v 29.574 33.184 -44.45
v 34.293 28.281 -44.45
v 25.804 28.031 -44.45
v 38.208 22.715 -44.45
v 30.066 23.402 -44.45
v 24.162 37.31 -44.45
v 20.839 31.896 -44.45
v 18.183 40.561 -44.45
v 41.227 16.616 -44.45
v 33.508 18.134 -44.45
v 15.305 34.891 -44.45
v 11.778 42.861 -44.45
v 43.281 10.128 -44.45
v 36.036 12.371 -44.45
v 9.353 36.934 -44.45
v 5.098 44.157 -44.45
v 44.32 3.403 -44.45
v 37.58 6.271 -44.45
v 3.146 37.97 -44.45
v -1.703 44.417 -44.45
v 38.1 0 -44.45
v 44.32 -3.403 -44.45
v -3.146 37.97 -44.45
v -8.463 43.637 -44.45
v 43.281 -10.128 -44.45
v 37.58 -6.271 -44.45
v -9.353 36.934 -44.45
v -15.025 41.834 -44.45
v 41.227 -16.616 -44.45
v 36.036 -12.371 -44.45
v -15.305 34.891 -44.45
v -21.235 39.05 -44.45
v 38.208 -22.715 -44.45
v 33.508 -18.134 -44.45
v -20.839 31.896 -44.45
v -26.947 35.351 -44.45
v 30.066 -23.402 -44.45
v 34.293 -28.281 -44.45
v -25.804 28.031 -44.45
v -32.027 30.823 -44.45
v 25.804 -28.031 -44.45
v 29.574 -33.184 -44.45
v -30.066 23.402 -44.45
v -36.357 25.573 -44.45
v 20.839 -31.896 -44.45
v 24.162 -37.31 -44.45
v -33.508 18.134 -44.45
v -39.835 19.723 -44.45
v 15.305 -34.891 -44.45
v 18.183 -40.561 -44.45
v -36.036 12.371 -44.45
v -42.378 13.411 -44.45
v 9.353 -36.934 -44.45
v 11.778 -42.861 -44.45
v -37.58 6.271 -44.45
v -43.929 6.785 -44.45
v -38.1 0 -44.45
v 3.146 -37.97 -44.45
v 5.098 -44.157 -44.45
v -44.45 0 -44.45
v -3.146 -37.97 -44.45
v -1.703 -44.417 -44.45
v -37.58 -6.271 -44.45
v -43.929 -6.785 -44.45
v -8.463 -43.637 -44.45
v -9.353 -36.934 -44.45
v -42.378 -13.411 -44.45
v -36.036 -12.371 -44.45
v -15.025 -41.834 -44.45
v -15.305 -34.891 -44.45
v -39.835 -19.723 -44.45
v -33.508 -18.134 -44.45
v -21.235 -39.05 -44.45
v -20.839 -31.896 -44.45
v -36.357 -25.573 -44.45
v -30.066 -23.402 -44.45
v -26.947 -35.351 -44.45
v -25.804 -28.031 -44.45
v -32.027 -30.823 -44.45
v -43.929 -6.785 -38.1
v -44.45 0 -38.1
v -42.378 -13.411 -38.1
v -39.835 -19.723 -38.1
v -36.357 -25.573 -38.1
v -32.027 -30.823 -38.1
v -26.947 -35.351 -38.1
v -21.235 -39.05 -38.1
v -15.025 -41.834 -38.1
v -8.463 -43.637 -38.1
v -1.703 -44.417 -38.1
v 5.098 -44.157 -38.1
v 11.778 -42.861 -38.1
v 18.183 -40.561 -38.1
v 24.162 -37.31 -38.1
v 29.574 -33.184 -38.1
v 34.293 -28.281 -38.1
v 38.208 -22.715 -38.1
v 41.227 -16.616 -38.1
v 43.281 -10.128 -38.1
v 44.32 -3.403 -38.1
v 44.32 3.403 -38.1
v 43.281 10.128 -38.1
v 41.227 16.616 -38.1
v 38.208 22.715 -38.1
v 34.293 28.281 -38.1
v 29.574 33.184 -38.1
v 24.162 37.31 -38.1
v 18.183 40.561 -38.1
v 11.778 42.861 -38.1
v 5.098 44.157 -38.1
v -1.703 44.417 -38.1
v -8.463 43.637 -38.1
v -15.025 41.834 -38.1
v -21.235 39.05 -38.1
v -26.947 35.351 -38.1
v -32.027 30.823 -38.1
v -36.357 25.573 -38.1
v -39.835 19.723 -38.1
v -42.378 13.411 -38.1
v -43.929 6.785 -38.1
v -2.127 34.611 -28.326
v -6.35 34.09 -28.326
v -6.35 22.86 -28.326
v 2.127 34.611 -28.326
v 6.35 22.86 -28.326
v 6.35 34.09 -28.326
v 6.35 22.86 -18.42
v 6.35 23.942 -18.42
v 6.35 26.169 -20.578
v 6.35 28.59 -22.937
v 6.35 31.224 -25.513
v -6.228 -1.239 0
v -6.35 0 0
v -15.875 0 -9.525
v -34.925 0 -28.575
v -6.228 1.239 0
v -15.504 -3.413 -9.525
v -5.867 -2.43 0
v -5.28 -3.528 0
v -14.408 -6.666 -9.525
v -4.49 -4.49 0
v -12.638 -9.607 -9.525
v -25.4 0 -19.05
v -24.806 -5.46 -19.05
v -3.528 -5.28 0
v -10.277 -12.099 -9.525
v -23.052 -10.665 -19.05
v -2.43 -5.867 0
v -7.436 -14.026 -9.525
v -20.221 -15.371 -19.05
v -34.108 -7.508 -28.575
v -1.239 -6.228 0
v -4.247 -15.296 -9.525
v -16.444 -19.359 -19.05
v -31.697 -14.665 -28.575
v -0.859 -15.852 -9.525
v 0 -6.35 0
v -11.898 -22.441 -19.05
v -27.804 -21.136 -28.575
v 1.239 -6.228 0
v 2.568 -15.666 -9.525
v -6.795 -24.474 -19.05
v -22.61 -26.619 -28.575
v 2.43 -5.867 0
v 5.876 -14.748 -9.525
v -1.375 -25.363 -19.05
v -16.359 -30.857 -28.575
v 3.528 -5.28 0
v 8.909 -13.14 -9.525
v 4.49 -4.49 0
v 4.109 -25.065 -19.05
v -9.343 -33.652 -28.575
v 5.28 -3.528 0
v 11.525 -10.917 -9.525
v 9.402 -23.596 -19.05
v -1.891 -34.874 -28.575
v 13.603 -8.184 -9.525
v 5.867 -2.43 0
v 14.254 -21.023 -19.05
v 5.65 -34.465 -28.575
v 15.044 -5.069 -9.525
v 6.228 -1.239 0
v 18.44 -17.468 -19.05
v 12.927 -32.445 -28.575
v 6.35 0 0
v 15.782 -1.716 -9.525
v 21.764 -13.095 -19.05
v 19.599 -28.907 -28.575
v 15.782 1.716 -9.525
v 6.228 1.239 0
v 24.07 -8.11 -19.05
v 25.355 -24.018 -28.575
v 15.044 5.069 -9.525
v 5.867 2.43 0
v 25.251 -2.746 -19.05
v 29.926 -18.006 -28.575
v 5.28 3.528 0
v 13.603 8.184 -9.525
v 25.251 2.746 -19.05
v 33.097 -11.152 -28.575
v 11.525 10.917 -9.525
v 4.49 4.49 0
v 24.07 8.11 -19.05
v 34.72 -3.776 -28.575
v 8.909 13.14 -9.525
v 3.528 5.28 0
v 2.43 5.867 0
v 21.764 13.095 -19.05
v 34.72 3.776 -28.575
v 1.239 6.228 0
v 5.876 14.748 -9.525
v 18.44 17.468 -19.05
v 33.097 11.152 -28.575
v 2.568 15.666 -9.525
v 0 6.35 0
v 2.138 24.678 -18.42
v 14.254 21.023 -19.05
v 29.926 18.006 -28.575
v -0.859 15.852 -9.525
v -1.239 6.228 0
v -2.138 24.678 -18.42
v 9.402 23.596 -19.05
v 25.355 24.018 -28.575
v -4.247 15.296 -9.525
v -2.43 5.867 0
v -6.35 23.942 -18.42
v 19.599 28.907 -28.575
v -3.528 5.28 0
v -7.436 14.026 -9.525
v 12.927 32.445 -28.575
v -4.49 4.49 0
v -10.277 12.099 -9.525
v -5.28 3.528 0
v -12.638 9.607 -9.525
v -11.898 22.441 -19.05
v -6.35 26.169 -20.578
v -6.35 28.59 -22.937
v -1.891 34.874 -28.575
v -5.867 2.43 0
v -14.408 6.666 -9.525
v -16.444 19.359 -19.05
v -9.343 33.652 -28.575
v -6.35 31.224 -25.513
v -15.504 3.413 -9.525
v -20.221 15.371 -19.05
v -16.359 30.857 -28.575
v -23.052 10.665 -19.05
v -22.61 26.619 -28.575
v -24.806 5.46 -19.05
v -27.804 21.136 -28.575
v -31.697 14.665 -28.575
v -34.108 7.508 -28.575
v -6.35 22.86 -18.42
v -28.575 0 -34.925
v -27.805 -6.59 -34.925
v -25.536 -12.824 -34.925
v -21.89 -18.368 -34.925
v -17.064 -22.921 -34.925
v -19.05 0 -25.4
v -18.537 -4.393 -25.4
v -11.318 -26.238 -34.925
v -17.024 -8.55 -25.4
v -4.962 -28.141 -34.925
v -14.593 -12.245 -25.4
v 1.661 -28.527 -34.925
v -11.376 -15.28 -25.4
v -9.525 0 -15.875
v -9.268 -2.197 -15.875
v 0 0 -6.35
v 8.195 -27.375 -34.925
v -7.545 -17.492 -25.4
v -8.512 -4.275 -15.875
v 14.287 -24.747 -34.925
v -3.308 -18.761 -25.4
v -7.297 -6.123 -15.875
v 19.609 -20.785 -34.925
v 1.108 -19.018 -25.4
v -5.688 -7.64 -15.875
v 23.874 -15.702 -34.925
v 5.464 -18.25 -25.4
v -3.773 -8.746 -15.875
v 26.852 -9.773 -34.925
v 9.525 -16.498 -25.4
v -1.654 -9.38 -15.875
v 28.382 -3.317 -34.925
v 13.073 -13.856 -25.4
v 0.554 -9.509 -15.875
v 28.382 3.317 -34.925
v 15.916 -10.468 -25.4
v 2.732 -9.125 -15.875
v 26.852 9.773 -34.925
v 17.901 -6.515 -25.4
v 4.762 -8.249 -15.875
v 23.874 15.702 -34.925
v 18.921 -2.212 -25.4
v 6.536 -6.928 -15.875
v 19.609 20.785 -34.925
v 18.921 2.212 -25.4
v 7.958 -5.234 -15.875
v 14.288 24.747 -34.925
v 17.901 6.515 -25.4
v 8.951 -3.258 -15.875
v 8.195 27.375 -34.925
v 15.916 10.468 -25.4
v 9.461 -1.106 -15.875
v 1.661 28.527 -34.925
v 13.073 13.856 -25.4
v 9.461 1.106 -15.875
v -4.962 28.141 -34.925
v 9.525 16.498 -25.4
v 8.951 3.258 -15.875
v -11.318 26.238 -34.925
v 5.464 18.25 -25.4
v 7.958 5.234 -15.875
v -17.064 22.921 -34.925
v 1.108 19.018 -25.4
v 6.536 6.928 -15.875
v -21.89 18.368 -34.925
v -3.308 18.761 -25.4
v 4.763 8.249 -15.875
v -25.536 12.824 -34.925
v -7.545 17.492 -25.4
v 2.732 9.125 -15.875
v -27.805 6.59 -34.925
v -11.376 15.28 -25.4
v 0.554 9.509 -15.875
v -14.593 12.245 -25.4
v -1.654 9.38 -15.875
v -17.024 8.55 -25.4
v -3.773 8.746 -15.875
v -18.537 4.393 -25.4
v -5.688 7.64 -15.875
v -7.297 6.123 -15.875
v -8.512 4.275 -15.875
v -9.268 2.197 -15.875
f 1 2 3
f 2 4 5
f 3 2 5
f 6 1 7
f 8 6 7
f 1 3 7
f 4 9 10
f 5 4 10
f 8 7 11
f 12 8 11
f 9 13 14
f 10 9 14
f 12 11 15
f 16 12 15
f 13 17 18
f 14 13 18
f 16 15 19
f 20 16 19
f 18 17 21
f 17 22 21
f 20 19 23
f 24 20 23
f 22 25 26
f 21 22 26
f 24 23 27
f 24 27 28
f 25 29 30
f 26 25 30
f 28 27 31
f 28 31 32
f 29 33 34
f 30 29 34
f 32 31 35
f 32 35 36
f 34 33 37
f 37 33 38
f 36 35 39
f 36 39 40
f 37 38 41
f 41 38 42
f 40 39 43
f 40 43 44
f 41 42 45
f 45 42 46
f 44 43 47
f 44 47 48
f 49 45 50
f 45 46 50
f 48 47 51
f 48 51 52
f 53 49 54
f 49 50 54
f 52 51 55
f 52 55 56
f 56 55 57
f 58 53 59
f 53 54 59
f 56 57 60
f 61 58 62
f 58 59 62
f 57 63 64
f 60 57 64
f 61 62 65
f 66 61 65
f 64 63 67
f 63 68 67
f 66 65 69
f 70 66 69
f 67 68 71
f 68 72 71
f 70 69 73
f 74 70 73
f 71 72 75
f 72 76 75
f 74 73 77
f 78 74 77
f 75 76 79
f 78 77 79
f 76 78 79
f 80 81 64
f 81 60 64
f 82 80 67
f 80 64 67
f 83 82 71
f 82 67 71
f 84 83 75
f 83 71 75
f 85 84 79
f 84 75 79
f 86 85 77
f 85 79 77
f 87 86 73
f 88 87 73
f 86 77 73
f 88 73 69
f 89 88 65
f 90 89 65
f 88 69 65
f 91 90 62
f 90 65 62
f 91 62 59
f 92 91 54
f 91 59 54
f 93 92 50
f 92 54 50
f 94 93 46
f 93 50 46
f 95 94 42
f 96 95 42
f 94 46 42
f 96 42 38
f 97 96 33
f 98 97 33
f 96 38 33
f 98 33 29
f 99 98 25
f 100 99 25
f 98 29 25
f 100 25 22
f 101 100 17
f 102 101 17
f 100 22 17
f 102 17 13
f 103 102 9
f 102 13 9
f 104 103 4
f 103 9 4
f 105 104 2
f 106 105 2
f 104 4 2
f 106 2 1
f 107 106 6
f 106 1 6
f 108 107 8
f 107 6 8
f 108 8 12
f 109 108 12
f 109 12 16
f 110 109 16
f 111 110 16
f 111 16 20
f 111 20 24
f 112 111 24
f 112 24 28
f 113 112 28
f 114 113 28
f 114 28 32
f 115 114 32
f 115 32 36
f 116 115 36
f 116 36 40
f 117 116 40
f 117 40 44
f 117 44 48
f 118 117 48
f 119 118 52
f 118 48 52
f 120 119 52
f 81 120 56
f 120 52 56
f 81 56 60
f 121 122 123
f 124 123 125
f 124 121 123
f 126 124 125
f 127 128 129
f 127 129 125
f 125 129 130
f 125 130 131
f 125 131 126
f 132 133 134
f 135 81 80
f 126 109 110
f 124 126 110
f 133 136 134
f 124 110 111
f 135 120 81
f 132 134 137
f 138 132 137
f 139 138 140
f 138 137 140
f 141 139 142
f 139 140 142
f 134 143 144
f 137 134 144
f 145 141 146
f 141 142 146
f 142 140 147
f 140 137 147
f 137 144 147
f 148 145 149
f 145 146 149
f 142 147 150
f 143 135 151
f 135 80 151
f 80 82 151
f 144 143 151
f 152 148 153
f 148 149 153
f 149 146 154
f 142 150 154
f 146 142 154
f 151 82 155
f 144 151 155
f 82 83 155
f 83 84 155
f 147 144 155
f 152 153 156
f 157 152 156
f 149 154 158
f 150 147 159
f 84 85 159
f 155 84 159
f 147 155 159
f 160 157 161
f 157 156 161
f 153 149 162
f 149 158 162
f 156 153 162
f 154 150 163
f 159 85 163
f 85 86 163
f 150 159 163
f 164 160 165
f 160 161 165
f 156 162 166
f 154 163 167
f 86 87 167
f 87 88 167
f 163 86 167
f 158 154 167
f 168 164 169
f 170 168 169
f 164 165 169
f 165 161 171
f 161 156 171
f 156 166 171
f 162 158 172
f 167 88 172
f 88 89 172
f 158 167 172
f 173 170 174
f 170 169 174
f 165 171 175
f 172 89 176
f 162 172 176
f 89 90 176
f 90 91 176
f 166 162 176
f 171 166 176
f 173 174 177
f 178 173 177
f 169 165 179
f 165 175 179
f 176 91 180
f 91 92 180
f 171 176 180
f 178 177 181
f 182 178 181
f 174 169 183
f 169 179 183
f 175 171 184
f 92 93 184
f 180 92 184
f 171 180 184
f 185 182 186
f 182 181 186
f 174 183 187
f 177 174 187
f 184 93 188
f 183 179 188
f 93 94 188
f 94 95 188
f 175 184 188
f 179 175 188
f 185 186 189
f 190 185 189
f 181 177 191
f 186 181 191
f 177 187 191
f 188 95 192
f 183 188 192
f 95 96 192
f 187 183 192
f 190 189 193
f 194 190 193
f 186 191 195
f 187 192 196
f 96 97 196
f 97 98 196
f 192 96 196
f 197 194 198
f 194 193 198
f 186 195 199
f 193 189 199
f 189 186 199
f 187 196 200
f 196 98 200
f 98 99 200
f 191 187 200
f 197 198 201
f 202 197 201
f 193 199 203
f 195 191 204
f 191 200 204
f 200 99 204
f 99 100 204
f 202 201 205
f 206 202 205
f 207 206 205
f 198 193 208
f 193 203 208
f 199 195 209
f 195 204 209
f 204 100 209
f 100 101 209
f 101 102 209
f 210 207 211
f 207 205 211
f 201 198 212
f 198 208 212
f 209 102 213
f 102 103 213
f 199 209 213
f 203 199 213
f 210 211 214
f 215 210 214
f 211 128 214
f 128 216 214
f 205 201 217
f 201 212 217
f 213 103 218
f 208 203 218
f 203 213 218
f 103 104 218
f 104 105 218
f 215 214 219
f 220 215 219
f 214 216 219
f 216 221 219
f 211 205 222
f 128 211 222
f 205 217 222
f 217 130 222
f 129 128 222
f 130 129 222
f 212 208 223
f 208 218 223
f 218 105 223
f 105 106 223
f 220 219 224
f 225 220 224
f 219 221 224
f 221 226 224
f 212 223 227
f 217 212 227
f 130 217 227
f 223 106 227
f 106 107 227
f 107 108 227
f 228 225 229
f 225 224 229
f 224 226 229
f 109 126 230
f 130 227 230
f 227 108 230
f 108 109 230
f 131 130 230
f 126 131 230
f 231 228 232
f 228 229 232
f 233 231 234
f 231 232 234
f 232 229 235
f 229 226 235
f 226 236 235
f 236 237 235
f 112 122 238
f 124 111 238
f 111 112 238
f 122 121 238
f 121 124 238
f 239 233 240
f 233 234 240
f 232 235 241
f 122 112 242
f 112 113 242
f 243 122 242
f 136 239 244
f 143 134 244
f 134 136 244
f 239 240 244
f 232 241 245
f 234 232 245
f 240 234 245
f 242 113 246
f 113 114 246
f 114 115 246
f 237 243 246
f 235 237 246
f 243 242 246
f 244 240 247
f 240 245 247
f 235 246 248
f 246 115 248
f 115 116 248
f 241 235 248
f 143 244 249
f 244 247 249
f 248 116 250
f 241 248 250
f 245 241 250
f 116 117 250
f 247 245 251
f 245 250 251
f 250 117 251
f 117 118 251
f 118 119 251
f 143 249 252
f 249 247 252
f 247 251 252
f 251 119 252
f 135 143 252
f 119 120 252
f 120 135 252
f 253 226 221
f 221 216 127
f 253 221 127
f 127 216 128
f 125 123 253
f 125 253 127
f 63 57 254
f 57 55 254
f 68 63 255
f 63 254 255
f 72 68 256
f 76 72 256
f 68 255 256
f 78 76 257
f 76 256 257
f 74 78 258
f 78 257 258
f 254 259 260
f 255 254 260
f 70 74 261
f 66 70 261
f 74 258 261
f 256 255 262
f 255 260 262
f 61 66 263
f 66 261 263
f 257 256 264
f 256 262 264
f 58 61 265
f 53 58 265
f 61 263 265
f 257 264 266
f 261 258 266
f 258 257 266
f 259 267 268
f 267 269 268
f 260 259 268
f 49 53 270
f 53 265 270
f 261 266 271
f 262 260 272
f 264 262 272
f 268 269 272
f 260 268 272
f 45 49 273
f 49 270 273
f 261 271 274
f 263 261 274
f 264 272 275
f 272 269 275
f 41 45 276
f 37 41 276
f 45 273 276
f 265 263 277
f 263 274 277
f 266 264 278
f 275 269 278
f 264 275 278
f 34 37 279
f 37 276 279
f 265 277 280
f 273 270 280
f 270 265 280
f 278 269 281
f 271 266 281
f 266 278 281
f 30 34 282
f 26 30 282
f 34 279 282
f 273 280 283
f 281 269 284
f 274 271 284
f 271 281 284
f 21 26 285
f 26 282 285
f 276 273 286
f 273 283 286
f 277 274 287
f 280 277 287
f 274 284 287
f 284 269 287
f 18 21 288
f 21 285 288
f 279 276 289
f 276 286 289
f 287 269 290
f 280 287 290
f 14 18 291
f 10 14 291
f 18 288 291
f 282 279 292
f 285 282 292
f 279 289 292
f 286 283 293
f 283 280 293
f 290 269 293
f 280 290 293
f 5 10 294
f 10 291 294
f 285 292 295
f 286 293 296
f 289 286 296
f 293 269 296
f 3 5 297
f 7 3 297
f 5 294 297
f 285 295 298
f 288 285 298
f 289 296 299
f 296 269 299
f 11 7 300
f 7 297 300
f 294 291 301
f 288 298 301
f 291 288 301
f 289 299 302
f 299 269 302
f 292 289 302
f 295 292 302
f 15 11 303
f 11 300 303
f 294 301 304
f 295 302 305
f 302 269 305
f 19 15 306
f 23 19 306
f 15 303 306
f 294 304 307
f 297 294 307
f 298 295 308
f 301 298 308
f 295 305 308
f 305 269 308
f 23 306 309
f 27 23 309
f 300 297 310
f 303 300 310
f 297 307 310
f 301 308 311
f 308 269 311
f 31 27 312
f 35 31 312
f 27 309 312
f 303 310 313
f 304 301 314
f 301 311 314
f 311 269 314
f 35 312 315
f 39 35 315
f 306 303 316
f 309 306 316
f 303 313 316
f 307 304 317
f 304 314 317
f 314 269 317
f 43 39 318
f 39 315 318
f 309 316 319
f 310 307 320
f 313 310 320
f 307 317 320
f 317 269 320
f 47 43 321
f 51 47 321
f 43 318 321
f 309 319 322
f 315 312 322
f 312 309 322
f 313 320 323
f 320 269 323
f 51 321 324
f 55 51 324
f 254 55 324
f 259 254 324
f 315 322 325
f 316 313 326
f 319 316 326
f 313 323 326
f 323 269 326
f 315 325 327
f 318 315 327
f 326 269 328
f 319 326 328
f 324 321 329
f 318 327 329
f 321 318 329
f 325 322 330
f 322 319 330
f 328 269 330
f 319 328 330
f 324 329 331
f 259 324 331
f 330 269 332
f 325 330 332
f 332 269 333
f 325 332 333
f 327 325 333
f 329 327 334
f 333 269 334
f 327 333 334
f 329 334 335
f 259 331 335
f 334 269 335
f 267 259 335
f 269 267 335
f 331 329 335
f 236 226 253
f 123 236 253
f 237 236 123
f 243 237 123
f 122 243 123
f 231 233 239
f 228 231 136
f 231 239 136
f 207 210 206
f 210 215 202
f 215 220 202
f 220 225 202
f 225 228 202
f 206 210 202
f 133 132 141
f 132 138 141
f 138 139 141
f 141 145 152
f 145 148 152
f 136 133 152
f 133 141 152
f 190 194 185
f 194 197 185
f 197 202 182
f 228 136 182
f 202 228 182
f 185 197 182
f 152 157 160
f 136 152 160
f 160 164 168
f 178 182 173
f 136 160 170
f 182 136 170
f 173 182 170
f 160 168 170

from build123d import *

# Parameters (mm, degrees)
CUT_EXTRUDE1_START = 38.1
SKETCH4_W          = 12.7
SKETCH4_H          = 9.906
CUT_EXTRUDE1_DEPTH = 15.24


with BuildPart() as part:
    # Sketch2 → Revolve2 (revolve)
    with BuildSketch(Plane(origin=(0, 0, 0), x_dir=(0, 0, -1), z_dir=(1, 0, 0)), mode=Mode.PRIVATE) as revolve2_sk:
        Polygon((0, 0), (0, 6.35), (38.1, 44.45), (44.45, 44.45), (44.45, 38.1), (6.35, 0), align=None)
    revolve(revolve2_sk.sketch.rotate(Axis((0, 0, -6.35), (0, 0, 1)), 90), axis=Axis((0, 0, -6.35), (0, 0, 1)))

    # Sketch4 → Cut-Extrude1 (cut)
    with BuildSketch(Plane(origin=(0, 0, 0), x_dir=(1, 0, 0), z_dir=(0, 1, 0)).offset(CUT_EXTRUDE1_START)):
        with Locations((0, 23.373056835)):
            Rectangle(SKETCH4_W, SKETCH4_H)
    extrude(amount=-CUT_EXTRUDE1_DEPTH, mode=Mode.SUBTRACT)


solid = part.part
